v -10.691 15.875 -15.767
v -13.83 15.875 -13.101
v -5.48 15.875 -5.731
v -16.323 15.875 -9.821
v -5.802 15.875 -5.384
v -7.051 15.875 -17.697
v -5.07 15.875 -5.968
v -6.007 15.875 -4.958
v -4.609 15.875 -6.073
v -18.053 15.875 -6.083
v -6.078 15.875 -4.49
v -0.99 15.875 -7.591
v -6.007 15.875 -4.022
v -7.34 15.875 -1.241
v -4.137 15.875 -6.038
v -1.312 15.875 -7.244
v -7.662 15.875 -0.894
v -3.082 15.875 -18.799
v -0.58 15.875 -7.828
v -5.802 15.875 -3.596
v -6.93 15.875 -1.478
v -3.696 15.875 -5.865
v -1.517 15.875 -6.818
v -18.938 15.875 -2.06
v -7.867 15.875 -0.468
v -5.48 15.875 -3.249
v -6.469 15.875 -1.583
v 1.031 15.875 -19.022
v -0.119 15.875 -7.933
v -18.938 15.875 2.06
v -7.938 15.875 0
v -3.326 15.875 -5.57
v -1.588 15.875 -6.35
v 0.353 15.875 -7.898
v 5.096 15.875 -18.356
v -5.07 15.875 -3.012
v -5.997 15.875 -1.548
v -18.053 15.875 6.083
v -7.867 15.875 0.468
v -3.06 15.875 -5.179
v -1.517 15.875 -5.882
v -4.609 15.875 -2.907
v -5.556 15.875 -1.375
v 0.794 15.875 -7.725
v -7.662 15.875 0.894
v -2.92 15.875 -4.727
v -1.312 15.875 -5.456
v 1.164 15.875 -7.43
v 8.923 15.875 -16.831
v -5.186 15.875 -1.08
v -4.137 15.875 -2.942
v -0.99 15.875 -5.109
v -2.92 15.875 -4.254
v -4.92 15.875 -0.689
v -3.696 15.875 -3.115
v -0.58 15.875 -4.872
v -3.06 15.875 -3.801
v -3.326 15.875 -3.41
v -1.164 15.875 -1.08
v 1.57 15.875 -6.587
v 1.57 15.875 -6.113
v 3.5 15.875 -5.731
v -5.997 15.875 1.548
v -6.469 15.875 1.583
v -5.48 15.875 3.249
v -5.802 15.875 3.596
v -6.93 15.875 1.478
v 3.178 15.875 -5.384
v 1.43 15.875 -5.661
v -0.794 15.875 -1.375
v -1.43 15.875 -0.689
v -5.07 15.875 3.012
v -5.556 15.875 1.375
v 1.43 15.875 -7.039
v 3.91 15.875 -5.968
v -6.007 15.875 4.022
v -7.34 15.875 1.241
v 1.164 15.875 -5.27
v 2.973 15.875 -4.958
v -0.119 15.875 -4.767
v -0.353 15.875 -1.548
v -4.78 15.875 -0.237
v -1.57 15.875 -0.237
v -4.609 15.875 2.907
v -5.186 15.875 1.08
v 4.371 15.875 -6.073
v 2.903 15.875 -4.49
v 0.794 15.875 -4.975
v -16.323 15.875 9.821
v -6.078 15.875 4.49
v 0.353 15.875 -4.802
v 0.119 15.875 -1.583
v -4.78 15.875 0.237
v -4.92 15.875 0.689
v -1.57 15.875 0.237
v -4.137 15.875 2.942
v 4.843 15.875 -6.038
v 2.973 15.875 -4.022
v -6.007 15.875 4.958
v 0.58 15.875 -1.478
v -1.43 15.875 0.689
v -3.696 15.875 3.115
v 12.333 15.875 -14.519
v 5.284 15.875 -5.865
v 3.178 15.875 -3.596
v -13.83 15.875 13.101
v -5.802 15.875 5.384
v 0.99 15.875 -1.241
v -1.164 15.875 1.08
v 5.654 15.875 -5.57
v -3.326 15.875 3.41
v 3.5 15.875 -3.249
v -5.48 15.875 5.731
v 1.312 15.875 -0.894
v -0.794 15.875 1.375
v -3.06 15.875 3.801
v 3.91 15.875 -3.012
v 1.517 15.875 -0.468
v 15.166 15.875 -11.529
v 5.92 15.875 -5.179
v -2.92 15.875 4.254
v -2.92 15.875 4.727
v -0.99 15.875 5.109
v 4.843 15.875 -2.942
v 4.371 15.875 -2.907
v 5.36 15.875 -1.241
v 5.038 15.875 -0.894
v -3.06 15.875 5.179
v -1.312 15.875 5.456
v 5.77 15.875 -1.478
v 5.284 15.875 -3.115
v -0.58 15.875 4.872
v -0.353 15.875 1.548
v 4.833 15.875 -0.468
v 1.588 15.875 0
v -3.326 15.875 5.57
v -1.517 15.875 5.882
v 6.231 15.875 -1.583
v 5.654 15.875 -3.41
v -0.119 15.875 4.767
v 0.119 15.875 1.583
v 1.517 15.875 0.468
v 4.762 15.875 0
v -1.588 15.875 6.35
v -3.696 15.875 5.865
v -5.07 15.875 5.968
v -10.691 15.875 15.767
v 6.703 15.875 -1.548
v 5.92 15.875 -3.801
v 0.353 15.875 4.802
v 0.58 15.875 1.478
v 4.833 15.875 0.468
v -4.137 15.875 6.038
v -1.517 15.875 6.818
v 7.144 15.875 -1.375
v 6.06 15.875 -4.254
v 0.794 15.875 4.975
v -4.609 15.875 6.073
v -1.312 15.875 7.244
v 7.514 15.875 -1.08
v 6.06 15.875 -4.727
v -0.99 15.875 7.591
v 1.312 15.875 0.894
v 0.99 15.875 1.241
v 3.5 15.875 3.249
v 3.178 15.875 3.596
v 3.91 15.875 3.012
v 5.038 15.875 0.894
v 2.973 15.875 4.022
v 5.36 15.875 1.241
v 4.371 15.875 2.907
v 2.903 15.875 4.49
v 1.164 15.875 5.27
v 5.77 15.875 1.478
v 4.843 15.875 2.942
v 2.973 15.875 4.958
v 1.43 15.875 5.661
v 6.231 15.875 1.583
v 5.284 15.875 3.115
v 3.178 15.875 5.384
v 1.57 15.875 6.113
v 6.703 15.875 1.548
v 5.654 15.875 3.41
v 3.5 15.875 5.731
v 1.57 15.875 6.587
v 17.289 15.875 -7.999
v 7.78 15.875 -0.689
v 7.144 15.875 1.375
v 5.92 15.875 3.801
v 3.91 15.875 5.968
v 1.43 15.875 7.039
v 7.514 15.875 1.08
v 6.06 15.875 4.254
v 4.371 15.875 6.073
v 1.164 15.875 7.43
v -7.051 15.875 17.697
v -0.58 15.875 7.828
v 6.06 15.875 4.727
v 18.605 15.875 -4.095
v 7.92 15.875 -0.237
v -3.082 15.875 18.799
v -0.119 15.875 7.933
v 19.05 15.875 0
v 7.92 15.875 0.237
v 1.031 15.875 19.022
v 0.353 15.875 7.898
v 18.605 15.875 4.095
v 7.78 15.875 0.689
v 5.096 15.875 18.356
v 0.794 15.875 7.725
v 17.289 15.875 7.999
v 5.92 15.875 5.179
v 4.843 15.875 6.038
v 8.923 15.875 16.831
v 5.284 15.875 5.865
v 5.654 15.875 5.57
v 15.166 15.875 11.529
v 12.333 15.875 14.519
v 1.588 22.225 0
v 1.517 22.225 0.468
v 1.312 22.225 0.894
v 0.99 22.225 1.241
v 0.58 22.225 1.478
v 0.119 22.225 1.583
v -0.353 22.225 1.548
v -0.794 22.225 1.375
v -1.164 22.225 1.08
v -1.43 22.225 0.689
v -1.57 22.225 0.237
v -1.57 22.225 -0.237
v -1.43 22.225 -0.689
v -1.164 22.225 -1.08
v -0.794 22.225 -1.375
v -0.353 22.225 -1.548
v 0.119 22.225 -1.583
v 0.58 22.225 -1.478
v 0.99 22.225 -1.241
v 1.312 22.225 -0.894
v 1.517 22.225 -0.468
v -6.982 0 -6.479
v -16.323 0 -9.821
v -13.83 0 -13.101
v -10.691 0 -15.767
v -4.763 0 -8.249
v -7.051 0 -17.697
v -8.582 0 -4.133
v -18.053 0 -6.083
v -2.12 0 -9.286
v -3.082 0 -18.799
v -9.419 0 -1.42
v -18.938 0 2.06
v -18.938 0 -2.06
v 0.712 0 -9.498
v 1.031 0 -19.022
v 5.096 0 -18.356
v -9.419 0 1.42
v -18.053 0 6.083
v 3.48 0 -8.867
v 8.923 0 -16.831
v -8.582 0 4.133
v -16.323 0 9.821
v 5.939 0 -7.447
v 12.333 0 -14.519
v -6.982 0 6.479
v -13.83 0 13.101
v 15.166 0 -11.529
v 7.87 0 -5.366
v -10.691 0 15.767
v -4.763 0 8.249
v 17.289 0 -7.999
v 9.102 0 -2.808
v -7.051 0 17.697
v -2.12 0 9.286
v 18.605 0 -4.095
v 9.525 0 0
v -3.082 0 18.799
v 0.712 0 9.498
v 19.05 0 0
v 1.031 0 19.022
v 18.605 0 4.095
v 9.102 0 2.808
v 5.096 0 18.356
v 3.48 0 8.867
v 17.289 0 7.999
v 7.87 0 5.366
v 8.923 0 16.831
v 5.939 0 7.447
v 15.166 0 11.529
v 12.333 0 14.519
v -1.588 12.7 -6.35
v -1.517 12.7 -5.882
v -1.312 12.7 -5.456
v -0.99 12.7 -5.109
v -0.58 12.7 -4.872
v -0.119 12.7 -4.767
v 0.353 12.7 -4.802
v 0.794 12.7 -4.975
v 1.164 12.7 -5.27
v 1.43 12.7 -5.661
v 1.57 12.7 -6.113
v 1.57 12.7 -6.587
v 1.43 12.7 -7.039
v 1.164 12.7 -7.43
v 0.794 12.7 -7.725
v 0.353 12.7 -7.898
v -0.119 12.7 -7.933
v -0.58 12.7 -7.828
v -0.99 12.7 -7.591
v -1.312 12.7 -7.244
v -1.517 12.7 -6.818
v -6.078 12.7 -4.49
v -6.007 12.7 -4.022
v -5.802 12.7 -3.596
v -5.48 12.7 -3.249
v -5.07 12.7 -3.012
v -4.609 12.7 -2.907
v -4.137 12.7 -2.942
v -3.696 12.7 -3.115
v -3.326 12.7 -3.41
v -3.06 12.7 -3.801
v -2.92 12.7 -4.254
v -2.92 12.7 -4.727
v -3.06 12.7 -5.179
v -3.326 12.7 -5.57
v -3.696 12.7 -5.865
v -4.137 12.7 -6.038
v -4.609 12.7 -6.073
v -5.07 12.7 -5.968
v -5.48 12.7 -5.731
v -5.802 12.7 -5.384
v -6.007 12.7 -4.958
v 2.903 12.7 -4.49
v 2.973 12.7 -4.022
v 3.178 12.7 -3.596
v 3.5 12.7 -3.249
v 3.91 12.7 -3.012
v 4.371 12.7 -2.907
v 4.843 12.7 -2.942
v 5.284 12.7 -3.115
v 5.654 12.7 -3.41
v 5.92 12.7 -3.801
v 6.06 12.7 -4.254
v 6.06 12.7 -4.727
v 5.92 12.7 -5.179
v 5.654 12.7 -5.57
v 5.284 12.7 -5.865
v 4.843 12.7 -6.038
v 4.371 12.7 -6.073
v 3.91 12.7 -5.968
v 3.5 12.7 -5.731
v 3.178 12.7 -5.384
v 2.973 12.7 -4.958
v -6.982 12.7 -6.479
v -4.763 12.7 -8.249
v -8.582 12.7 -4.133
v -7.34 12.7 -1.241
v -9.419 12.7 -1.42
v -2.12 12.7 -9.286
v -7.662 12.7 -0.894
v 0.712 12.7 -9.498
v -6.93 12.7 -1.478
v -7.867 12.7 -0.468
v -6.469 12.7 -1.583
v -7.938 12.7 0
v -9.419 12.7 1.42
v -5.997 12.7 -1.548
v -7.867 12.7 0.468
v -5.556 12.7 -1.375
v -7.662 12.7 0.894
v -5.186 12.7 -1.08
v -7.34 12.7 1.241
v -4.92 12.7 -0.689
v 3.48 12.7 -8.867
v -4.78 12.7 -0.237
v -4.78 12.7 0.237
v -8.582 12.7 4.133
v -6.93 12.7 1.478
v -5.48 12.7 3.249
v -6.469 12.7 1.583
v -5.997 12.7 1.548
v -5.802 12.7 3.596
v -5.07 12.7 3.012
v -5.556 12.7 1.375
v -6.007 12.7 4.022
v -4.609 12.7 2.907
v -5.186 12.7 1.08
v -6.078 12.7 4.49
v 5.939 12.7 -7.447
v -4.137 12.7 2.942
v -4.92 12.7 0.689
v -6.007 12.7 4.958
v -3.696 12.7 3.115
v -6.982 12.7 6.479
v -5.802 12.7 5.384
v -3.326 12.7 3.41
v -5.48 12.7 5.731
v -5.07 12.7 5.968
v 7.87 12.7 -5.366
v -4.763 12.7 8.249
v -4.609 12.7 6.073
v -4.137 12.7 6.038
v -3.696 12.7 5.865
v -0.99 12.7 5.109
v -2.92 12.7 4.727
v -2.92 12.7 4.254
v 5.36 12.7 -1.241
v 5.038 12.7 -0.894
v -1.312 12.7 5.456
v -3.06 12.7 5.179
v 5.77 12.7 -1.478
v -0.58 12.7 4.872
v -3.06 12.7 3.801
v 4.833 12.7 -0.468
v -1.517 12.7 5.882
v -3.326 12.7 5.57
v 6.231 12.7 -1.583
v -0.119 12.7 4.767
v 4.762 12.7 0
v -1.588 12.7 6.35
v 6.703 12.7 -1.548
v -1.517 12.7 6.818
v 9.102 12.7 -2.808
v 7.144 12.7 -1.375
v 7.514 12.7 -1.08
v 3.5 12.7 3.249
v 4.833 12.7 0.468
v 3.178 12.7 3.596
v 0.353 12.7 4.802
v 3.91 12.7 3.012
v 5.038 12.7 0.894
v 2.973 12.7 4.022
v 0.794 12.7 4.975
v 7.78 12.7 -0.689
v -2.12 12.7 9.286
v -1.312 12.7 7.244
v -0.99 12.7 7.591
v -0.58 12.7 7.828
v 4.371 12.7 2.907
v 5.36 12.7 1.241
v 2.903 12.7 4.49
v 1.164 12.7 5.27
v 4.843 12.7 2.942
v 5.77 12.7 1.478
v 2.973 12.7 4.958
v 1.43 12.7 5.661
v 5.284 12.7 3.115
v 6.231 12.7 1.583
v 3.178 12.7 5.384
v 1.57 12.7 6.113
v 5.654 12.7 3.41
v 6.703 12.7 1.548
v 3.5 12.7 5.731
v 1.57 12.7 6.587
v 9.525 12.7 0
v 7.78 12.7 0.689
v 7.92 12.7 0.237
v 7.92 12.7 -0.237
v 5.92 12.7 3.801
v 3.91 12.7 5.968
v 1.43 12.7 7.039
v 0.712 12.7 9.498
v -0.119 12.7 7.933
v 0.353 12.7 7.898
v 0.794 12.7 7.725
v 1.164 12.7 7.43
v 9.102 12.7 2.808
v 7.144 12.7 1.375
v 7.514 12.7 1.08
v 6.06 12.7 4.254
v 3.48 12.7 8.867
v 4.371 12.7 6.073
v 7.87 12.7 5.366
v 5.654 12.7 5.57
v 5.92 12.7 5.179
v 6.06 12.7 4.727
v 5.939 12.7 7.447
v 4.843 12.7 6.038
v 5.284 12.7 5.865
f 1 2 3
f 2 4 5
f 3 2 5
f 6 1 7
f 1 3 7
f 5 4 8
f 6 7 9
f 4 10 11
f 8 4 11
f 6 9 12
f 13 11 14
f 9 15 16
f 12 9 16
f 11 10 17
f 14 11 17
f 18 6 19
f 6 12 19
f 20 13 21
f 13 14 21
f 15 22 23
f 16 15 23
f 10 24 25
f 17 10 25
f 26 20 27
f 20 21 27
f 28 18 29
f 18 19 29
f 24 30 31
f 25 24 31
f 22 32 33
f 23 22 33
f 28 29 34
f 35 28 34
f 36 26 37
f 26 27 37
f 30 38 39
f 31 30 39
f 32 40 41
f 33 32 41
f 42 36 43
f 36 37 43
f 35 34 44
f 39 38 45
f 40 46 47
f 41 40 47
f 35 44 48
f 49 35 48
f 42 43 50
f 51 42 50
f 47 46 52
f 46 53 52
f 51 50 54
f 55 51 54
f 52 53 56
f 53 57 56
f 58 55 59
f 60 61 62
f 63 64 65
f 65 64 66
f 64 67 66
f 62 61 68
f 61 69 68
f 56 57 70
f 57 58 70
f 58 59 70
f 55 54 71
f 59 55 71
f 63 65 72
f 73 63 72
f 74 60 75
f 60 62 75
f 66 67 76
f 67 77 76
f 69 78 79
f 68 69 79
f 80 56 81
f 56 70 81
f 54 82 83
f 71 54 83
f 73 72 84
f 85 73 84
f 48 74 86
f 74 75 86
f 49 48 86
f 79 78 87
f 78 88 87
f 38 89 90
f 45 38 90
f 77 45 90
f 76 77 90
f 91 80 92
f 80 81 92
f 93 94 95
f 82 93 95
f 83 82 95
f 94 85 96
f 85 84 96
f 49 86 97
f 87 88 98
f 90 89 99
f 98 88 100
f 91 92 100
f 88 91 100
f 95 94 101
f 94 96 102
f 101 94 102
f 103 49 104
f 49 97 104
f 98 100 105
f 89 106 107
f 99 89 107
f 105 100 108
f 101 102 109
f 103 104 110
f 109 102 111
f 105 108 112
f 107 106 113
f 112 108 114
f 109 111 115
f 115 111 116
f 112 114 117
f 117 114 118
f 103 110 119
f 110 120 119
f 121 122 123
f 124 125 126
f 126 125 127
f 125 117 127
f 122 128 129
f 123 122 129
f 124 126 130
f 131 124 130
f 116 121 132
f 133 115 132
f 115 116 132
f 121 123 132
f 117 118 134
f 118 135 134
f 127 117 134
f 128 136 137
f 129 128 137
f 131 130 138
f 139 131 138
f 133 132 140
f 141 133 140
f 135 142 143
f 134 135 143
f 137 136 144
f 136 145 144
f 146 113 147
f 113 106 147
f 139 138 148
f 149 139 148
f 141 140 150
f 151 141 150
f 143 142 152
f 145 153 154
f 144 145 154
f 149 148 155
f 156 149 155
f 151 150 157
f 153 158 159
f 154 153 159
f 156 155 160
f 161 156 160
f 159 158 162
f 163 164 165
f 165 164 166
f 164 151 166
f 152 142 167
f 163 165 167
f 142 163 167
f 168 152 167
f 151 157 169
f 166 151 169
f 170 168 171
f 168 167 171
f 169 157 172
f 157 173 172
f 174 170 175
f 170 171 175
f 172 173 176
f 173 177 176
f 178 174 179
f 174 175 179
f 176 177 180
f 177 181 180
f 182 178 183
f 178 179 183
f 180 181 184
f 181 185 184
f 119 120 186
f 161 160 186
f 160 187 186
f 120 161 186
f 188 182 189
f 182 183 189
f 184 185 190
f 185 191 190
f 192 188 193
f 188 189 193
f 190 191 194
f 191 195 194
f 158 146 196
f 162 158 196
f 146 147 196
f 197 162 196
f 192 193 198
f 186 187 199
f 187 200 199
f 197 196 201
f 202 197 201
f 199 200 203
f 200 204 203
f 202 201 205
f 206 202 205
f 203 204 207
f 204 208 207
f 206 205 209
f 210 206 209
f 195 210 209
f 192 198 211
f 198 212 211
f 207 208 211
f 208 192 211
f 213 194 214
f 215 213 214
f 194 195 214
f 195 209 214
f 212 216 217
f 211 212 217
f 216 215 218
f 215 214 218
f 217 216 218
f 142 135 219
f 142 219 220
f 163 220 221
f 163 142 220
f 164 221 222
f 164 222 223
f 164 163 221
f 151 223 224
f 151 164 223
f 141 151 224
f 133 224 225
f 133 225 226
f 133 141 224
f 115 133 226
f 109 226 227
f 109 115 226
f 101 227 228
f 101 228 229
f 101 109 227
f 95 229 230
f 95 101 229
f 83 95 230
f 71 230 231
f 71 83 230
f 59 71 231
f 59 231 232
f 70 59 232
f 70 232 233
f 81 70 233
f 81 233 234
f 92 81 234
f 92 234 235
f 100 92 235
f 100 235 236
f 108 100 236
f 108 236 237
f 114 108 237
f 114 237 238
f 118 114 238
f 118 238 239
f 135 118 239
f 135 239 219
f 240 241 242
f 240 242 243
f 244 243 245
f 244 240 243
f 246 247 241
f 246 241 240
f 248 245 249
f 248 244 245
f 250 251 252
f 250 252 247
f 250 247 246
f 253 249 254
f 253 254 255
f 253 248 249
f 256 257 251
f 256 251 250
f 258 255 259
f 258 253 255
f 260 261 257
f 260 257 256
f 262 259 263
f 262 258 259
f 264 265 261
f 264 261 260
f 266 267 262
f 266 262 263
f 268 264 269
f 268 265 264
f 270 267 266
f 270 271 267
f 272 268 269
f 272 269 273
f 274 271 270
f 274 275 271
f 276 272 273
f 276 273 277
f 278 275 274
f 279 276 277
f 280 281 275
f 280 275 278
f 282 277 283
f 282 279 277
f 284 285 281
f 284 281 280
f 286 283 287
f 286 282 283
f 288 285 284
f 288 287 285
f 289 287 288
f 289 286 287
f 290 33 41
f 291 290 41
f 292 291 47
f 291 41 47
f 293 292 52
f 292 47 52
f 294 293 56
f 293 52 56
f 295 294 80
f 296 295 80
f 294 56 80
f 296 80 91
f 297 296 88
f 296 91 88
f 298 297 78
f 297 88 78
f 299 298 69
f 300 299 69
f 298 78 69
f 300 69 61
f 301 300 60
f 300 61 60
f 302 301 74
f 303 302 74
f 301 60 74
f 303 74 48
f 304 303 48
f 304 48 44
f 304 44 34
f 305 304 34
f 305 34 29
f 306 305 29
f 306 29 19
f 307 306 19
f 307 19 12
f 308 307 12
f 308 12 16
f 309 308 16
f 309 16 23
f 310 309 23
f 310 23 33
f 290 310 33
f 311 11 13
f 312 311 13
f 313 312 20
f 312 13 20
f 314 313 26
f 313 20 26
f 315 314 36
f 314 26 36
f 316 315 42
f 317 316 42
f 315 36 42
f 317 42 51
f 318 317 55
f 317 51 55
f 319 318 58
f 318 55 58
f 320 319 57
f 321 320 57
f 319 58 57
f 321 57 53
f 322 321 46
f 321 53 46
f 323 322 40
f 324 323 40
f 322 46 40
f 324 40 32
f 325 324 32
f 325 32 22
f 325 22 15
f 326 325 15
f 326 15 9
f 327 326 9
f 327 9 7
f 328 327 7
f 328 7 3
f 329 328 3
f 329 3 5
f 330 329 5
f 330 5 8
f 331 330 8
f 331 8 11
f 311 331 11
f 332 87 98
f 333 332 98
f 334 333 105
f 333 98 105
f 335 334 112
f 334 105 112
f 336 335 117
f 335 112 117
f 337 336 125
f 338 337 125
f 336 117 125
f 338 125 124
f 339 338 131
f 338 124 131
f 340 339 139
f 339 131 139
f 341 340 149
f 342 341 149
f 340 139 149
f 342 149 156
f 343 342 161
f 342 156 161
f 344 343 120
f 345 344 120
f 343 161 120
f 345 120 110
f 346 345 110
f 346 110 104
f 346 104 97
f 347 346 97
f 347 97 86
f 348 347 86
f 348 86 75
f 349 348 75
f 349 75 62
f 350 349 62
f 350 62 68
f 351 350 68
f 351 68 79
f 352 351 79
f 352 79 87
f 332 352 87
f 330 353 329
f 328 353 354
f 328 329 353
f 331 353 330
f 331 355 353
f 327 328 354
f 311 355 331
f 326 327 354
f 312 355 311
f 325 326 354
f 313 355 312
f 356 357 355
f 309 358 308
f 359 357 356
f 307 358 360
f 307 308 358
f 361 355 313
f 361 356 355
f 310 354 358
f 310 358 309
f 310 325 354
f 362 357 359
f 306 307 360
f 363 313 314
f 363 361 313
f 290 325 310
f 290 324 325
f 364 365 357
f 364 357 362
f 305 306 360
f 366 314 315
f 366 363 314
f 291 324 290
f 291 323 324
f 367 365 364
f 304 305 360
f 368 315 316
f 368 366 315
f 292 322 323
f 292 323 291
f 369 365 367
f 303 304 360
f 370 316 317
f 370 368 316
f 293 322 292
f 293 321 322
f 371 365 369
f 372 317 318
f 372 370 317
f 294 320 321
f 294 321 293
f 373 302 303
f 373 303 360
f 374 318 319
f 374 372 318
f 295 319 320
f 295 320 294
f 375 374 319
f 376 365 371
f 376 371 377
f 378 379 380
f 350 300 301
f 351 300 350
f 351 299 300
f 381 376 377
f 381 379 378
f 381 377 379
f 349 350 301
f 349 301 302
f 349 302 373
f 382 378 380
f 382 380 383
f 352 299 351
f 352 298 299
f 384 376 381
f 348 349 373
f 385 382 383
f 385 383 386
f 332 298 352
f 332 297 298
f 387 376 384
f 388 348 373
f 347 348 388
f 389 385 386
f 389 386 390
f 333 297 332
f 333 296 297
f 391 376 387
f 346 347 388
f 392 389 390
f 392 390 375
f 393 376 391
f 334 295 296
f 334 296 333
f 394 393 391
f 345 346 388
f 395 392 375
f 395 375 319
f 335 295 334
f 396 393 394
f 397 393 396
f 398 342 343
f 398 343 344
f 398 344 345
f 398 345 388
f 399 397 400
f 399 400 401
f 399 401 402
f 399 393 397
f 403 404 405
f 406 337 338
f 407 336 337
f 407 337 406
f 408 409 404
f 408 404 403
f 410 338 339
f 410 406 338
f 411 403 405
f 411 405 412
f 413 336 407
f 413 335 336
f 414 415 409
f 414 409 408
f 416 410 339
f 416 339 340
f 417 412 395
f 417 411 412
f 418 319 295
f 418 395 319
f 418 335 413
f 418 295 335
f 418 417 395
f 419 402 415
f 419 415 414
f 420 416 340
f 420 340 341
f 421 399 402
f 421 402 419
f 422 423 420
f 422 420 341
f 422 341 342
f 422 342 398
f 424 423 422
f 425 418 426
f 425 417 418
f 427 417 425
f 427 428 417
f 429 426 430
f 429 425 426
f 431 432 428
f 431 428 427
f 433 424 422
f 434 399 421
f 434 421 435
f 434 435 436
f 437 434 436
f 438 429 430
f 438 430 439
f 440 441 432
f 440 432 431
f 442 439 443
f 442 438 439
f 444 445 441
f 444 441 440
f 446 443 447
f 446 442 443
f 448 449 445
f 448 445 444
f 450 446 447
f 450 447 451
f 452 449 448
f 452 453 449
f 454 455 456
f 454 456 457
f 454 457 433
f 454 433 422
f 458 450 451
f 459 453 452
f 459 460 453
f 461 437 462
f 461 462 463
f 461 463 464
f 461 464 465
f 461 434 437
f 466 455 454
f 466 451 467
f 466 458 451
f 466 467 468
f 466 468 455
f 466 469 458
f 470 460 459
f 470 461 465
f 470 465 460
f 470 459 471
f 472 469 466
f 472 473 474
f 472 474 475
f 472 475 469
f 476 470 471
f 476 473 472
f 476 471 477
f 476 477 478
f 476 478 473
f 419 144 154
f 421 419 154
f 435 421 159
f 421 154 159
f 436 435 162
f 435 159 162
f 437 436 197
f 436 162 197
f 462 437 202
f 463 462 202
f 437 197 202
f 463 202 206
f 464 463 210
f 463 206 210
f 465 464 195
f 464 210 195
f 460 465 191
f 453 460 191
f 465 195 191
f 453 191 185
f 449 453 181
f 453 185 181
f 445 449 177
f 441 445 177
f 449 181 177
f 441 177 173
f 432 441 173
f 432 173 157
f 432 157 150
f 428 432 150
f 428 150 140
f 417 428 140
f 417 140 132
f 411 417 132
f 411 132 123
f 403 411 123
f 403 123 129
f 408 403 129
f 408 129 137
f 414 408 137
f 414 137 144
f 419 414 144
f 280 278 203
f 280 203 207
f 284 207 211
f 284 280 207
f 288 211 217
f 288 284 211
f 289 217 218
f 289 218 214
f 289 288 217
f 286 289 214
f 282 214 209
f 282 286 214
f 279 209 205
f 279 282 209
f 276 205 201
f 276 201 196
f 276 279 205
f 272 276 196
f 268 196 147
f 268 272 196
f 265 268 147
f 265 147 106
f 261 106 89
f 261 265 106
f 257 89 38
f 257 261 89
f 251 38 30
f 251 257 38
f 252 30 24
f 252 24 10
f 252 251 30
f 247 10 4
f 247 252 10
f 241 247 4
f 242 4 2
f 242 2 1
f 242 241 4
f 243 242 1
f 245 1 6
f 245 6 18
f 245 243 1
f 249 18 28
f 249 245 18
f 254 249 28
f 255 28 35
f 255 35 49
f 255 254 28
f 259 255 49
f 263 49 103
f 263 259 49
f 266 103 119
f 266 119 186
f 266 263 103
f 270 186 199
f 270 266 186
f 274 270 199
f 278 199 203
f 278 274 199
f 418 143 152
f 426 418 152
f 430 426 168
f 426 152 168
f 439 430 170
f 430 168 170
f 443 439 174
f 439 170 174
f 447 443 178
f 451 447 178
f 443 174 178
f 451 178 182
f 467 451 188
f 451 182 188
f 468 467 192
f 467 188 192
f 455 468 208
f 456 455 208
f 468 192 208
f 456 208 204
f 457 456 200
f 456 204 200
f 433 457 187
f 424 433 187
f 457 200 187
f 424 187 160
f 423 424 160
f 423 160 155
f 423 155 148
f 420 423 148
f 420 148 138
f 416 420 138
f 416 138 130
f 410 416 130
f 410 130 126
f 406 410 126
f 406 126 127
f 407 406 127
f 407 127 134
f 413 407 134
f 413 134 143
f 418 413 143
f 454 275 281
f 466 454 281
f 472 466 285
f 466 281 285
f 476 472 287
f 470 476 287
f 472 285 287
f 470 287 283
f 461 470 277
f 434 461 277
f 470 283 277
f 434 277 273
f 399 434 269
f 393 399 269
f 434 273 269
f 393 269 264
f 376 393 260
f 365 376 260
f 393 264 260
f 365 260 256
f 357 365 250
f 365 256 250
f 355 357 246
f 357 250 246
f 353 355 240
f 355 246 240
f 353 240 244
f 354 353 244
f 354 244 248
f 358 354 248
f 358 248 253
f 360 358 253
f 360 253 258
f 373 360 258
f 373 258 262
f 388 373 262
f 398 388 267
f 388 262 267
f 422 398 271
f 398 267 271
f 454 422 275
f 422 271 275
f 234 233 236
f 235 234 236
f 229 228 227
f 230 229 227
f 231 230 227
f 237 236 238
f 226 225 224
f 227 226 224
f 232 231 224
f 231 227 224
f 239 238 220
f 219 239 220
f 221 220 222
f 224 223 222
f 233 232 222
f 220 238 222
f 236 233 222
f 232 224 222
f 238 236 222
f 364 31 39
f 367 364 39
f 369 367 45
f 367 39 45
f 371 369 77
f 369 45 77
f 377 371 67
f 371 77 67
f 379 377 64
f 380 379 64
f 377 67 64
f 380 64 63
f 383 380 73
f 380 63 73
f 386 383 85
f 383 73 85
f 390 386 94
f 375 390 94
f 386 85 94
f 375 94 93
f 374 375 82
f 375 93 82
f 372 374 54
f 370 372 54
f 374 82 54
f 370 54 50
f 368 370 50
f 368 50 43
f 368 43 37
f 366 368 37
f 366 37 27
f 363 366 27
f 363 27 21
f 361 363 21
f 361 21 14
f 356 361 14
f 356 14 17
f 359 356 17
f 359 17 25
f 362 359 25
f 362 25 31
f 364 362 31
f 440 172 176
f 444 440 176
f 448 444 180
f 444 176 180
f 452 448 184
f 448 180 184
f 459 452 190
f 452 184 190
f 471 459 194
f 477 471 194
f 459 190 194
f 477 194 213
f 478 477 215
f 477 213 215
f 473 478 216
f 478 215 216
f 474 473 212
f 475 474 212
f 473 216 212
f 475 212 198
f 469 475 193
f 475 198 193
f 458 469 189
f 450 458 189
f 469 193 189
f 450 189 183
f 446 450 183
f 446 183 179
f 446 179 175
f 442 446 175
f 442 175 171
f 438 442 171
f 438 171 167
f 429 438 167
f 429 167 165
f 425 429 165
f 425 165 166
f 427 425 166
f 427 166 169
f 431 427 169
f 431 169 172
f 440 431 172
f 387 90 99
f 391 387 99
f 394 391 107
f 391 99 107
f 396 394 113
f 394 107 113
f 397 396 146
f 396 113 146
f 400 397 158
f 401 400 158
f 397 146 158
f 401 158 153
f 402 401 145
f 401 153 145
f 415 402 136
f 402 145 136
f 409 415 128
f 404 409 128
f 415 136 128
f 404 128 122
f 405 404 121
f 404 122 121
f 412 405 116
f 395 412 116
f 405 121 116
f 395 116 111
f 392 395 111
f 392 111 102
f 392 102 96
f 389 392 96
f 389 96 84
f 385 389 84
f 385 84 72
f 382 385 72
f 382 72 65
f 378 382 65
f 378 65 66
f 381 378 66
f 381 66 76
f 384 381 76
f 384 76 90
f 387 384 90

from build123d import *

# Parameters (mm, degrees)
F0_R     = 19.05
F1_DEPTH = 15.875
F2_R     = 9.525
F3_DEPTH = 12.7
F5_R     = 1.5875
F6_DEPTH = 9.525
F7_R     = 1.5875
F8_DEPTH = 25.4


with BuildPart() as f1:
    # F0 (on Front) → F1 (new body)
    with BuildSketch(Plane.XZ):
        Circle(F0_R)
    extrude(amount=-F1_DEPTH)

    # F2 (on face) → F3 (cut)
    with BuildSketch(Plane.XZ):
        Circle(F2_R)
    extrude(amount=-F3_DEPTH, mode=Mode.SUBTRACT)

    # F5 (on face) → F6 (join)
    with BuildSketch(Plane.XZ.offset(-12.7)):
        Circle(F5_R)
    extrude(amount=-F6_DEPTH)

    # F7 (on face) → F8 (cut)
    with BuildSketch(Plane(origin=(0, 15.875, 0), x_dir=(-1, 0, 0), z_dir=(0, 1, 0))):
        with Locations((0, 6.35)):
            Circle(F7_R)
        with Locations((-4.490128, 4.490128)):
            Circle(F7_R)
        with Locations((-6.35, 0)):
            Circle(F7_R)
        with Locations((-4.490128, -4.490128)):
            Circle(F7_R)
        with Locations((0, -6.35)):
            Circle(F7_R)
        with Locations((4.490128, -4.490128)):
            Circle(F7_R)
        with Locations((6.35, 0)):
            Circle(F7_R)
        with Locations((4.490128, 4.490128)):
            Circle(F7_R)
    extrude(amount=-F8_DEPTH, mode=Mode.SUBTRACT)


solid = f1.part
